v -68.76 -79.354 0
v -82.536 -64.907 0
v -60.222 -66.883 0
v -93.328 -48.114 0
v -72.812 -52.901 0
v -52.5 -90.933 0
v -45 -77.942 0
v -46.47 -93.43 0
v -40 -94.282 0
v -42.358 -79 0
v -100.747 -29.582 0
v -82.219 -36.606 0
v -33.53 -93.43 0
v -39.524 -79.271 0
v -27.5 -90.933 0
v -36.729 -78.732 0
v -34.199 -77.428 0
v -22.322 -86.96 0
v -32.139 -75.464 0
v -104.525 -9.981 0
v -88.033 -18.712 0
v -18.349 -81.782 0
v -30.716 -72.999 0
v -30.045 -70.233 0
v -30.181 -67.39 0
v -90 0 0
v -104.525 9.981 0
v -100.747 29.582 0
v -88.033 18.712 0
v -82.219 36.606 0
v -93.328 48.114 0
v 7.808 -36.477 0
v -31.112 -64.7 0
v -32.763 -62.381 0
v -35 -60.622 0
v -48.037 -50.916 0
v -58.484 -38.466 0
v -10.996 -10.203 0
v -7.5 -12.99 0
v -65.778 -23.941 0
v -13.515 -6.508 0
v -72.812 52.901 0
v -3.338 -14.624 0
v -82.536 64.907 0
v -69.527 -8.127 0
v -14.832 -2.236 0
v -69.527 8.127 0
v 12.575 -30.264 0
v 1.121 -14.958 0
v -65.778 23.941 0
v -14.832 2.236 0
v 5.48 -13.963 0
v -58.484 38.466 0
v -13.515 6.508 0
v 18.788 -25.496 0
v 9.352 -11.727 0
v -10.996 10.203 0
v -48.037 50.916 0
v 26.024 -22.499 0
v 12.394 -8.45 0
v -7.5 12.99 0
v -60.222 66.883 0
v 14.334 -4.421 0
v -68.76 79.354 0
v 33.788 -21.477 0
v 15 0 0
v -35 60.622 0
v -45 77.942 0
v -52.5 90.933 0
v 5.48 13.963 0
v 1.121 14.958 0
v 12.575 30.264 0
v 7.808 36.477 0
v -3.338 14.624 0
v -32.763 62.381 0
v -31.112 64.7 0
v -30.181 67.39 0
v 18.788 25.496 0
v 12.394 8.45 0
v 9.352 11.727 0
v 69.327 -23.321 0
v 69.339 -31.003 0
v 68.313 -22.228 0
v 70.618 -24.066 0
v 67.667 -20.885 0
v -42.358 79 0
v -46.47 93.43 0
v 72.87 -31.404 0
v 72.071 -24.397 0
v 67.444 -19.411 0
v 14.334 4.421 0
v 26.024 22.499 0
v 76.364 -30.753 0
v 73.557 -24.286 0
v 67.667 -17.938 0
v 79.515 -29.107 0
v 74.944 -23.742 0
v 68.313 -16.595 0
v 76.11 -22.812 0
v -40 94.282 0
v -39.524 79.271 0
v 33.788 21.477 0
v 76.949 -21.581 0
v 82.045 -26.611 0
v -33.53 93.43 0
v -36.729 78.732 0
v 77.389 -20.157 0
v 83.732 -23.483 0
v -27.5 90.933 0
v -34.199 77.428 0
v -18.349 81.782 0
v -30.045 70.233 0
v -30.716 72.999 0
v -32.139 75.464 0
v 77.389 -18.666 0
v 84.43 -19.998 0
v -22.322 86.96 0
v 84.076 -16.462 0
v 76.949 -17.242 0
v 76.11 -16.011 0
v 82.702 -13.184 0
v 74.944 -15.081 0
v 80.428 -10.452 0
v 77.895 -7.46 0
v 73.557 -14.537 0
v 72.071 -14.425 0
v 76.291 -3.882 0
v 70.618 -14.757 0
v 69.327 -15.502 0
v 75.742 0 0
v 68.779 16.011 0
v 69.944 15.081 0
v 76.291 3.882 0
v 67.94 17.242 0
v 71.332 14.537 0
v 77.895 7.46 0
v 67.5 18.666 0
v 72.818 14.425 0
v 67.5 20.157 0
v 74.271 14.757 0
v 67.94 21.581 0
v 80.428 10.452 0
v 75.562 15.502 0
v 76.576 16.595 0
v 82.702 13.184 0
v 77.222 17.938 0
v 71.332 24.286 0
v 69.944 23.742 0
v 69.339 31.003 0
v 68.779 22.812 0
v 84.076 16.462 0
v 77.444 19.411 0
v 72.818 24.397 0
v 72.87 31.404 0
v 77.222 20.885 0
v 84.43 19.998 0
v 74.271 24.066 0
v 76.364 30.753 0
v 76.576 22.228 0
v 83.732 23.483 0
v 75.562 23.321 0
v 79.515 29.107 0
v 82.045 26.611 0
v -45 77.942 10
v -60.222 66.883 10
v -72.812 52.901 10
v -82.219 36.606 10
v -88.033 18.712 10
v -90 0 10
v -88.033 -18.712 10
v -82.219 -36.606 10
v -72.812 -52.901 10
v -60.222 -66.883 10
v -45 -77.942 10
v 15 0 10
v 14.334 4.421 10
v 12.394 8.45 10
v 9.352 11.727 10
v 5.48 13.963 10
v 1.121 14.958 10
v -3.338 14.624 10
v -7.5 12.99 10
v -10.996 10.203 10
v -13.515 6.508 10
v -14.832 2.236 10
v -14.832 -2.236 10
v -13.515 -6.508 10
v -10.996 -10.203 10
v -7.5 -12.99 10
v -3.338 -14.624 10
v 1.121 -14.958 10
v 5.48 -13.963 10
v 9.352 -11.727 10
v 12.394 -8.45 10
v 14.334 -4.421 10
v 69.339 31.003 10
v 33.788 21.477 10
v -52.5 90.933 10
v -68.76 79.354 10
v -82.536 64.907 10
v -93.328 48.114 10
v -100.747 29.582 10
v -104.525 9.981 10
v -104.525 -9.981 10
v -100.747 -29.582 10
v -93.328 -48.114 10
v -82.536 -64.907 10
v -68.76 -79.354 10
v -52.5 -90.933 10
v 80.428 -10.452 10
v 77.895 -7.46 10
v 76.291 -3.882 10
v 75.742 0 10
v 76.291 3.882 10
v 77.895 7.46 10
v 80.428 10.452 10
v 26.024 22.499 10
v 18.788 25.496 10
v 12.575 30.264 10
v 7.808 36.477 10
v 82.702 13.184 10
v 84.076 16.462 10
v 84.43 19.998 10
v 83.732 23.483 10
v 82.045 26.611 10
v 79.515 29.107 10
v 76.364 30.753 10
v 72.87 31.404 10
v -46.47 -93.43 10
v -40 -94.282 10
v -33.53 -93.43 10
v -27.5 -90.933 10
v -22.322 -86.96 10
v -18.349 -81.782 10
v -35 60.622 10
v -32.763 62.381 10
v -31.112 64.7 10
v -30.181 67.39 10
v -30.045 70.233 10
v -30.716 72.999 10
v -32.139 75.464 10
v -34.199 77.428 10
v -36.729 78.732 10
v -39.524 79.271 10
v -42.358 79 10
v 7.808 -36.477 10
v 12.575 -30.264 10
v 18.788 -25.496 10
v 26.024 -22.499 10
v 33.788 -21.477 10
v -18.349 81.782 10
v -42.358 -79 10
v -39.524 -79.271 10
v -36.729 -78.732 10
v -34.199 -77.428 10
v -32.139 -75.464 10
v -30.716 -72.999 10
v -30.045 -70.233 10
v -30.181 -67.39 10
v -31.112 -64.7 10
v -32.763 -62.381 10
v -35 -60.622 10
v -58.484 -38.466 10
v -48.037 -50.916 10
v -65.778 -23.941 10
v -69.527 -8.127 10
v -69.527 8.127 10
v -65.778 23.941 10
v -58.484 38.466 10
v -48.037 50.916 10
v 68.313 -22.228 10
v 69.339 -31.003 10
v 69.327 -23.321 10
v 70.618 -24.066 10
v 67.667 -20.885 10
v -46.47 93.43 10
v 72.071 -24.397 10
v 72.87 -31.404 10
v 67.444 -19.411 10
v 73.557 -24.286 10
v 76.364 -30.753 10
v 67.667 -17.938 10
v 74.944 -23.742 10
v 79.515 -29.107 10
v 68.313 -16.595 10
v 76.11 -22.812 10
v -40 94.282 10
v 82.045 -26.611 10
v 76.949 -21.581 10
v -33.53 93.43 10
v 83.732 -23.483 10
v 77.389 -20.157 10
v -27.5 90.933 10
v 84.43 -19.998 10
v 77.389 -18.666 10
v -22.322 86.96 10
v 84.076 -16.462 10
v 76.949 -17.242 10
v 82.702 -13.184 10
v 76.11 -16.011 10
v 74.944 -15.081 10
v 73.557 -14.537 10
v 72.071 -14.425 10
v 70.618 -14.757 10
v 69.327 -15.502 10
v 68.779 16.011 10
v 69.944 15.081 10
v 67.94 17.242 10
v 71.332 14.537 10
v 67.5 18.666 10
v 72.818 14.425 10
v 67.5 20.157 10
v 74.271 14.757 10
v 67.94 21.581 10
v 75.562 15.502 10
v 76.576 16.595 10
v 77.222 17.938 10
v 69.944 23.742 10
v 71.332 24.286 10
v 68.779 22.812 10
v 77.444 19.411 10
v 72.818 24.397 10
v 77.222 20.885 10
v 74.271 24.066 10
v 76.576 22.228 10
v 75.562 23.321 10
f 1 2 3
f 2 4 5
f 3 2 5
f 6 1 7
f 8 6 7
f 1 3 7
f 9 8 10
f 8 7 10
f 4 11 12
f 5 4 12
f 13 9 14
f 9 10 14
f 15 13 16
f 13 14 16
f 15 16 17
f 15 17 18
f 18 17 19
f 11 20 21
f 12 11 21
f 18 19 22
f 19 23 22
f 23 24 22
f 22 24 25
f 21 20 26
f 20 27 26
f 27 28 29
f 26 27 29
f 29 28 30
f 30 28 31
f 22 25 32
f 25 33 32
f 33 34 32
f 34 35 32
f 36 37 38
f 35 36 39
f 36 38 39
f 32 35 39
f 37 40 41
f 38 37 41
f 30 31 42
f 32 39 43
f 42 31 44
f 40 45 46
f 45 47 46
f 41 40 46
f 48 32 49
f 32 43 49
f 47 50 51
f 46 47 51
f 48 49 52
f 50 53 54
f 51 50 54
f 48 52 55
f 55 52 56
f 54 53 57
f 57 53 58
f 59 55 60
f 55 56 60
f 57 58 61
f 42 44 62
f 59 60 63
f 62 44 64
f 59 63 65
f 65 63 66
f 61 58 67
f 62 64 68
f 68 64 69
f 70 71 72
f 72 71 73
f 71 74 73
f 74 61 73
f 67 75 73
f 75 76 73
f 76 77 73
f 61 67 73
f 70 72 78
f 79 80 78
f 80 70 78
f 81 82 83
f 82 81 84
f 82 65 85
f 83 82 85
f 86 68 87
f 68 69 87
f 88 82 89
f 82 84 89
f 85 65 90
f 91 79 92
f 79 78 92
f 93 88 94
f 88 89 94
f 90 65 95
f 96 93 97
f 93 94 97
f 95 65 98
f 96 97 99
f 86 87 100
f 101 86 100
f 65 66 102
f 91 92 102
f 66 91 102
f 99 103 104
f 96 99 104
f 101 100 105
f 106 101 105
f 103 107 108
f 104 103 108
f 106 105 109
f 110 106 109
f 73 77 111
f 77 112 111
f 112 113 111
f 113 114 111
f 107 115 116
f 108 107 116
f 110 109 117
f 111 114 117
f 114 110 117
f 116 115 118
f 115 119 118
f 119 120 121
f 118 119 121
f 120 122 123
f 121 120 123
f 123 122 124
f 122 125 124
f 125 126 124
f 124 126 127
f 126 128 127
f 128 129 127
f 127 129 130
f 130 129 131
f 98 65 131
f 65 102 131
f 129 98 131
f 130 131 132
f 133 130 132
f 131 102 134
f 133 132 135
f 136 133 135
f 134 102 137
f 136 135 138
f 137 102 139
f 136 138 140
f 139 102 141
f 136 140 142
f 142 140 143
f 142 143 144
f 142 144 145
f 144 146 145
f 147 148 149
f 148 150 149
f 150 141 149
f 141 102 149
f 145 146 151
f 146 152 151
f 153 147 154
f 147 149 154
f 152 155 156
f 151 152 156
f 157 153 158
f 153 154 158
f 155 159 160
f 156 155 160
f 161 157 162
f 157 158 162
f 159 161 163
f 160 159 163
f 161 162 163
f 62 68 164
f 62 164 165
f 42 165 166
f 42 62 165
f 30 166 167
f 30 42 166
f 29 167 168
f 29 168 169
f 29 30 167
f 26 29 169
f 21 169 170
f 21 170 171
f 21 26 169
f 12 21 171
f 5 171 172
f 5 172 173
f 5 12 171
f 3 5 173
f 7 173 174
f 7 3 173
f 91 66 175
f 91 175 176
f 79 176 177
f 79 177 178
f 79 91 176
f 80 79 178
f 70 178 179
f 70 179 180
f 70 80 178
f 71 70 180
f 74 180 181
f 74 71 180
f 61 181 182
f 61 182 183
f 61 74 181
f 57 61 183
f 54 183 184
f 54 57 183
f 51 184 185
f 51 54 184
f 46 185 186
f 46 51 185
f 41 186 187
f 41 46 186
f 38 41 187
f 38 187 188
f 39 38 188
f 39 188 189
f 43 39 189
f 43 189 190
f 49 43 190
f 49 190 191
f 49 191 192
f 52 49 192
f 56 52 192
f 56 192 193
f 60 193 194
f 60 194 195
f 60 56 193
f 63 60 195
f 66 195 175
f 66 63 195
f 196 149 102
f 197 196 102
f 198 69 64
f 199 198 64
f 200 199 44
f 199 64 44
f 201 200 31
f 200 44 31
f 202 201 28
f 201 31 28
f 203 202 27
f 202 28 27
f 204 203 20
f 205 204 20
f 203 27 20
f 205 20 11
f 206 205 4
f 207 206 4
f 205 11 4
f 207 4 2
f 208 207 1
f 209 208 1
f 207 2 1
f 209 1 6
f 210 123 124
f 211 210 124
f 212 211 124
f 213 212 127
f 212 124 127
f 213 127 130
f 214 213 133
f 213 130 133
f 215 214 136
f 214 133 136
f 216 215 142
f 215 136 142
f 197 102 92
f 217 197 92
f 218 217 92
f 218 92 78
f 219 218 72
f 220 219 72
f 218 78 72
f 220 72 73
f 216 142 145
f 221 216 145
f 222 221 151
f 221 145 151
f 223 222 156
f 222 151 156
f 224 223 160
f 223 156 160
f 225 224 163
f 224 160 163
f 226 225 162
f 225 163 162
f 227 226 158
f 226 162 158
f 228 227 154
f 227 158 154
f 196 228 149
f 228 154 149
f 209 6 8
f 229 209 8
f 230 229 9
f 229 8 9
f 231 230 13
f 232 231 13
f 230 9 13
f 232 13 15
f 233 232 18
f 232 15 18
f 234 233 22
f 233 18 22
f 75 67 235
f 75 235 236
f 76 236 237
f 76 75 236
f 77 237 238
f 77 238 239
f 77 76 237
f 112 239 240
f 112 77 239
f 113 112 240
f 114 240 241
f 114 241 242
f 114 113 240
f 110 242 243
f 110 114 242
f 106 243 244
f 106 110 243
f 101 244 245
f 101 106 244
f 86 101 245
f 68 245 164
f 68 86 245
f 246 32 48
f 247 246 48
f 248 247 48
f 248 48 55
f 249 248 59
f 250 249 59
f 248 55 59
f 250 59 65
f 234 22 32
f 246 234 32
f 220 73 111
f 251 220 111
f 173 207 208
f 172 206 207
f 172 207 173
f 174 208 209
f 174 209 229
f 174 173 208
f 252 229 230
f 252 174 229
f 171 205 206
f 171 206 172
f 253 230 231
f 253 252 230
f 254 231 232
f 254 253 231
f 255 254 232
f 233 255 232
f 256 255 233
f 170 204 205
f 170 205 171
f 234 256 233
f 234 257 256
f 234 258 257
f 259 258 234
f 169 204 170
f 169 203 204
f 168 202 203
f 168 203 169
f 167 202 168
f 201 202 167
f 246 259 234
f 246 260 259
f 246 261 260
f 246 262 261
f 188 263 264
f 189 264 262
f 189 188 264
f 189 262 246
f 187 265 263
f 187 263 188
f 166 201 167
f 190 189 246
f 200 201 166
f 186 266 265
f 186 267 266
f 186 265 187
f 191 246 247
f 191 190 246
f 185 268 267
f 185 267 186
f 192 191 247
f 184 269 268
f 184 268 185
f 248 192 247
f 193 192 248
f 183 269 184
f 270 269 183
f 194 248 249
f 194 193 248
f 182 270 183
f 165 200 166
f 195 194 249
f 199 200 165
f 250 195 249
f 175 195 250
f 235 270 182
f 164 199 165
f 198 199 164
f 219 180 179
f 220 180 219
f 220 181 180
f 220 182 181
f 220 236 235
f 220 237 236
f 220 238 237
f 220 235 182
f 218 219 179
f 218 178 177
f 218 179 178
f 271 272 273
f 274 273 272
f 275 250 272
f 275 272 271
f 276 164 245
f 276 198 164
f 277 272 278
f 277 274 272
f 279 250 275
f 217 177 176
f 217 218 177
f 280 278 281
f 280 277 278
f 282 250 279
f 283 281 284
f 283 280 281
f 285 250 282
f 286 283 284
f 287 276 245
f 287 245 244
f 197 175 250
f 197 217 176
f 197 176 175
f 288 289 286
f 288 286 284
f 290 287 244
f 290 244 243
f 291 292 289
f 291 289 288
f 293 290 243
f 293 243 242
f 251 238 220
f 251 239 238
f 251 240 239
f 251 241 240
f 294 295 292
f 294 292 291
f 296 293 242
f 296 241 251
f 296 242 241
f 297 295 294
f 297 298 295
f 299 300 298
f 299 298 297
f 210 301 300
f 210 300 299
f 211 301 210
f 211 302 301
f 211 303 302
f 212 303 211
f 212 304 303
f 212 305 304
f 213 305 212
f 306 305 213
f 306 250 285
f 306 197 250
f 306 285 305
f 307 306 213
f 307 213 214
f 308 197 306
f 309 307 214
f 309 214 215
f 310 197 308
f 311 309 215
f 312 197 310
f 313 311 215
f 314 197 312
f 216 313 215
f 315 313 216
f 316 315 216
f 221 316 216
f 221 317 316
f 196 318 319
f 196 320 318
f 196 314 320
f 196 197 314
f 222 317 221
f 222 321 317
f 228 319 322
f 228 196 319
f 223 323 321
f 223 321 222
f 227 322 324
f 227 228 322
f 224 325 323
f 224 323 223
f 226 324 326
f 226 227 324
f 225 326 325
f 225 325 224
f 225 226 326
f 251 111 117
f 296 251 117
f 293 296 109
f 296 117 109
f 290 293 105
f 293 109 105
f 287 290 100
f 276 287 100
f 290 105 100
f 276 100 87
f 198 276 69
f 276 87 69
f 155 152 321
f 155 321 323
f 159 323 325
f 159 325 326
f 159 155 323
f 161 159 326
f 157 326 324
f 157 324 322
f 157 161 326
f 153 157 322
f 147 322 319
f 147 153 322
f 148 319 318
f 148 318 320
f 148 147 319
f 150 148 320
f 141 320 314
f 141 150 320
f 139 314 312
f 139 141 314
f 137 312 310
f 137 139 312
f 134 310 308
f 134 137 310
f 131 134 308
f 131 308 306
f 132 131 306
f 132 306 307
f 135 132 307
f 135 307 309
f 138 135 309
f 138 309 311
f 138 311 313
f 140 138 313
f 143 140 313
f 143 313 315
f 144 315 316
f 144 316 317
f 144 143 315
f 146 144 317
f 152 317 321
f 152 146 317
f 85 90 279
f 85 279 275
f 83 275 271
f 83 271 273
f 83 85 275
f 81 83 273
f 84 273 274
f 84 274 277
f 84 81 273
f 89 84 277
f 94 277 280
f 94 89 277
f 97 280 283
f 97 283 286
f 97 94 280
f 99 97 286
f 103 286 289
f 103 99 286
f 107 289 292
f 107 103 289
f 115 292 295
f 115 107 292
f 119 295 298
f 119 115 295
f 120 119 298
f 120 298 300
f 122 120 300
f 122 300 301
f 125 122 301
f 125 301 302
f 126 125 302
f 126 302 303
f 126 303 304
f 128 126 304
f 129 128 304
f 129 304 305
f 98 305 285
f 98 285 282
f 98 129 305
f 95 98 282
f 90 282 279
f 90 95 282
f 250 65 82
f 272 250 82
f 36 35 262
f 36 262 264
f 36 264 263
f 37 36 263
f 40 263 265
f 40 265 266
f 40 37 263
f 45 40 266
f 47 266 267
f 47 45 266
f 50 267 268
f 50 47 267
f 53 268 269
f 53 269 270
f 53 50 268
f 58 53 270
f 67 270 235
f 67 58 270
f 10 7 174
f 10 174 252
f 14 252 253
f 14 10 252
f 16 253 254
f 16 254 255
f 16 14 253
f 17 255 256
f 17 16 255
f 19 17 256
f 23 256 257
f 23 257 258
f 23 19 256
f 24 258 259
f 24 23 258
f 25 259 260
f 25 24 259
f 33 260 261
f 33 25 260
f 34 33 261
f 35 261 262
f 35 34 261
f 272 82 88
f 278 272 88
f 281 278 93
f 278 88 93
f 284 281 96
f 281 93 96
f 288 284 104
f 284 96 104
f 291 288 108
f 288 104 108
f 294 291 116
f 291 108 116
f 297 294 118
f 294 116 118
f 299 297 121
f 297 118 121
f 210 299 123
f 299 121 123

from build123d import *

# Parameters (mm, degrees)
SKETCH1_R           = 15
SKETCH1_R_2         = 5
BOSS_EXTRUDE1_DEPTH = 10


with BuildPart() as part:
    # Sketch1 → Boss-Extrude1 (new body)
    with BuildSketch(Plane.XY):
        with BuildLine():
            Line((69.33860843, 31.002538298), (33.788342918, 21.476873363))
            ThreePointArc((33.788342918, 21.476873363), (18.788342918, 25.49611125), (7.807580804, 36.476873363))
            Line((7.807580804, 36.476873363), (-18.349364905, 81.782032303))
            ThreePointArc((-18.349364905, 81.782032303), (-33.529523872, 93.43017796), (-52.5, 90.932667397))
            ThreePointArc((-52.5, 90.932667397), (-105, 0), (-52.5, -90.932667397))
            ThreePointArc((-52.5, -90.932667397), (-33.529523872, -93.43017796), (-18.349364905, -81.782032303))
            Line((-18.349364905, -81.782032303), (7.807580804, -36.476873363))
            ThreePointArc((7.807580804, -36.476873363), (18.788342918, -25.49611125), (33.788342918, -21.476873363))
            Line((33.788342918, -21.476873363), (69.33860843, -31.002538298))
            ThreePointArc((69.33860843, -31.002538298), (83.00500475, -25.110060517), (80.427804346, -10.452307591))
            ThreePointArc((80.427804346, -10.452307591), (75.741732949, 0), (80.427804346, 10.452307591))
            ThreePointArc((80.427804346, 10.452307591), (83.00500475, 25.110060517), (69.33860843, 31.002538298))
        make_face()
        Circle(SKETCH1_R, mode=Mode.SUBTRACT)
        with Locations((72.444436972, 19.411428383)):
            Circle(SKETCH1_R_2, mode=Mode.SUBTRACT)
        with Locations(Location((72.444436972, -19.411428383, 0), (0, 0, 180))):
            Circle(SKETCH1_R_2, mode=Mode.SUBTRACT)
        with BuildLine():
            ThreePointArc((-45, 77.942286341), (-90, 0), (-45, -77.942286341))
            ThreePointArc((-45, -77.942286341), (-31.339745962, -74.282032303), (-35, -60.621778265))
            ThreePointArc((-35, -60.621778265), (-70, 0), (-35, 60.621778265))
            ThreePointArc((-35, 60.621778265), (-31.339745962, 74.282032303), (-45, 77.942286341))
        make_face(mode=Mode.SUBTRACT)
    extrude(amount=BOSS_EXTRUDE1_DEPTH)


solid = part.part
